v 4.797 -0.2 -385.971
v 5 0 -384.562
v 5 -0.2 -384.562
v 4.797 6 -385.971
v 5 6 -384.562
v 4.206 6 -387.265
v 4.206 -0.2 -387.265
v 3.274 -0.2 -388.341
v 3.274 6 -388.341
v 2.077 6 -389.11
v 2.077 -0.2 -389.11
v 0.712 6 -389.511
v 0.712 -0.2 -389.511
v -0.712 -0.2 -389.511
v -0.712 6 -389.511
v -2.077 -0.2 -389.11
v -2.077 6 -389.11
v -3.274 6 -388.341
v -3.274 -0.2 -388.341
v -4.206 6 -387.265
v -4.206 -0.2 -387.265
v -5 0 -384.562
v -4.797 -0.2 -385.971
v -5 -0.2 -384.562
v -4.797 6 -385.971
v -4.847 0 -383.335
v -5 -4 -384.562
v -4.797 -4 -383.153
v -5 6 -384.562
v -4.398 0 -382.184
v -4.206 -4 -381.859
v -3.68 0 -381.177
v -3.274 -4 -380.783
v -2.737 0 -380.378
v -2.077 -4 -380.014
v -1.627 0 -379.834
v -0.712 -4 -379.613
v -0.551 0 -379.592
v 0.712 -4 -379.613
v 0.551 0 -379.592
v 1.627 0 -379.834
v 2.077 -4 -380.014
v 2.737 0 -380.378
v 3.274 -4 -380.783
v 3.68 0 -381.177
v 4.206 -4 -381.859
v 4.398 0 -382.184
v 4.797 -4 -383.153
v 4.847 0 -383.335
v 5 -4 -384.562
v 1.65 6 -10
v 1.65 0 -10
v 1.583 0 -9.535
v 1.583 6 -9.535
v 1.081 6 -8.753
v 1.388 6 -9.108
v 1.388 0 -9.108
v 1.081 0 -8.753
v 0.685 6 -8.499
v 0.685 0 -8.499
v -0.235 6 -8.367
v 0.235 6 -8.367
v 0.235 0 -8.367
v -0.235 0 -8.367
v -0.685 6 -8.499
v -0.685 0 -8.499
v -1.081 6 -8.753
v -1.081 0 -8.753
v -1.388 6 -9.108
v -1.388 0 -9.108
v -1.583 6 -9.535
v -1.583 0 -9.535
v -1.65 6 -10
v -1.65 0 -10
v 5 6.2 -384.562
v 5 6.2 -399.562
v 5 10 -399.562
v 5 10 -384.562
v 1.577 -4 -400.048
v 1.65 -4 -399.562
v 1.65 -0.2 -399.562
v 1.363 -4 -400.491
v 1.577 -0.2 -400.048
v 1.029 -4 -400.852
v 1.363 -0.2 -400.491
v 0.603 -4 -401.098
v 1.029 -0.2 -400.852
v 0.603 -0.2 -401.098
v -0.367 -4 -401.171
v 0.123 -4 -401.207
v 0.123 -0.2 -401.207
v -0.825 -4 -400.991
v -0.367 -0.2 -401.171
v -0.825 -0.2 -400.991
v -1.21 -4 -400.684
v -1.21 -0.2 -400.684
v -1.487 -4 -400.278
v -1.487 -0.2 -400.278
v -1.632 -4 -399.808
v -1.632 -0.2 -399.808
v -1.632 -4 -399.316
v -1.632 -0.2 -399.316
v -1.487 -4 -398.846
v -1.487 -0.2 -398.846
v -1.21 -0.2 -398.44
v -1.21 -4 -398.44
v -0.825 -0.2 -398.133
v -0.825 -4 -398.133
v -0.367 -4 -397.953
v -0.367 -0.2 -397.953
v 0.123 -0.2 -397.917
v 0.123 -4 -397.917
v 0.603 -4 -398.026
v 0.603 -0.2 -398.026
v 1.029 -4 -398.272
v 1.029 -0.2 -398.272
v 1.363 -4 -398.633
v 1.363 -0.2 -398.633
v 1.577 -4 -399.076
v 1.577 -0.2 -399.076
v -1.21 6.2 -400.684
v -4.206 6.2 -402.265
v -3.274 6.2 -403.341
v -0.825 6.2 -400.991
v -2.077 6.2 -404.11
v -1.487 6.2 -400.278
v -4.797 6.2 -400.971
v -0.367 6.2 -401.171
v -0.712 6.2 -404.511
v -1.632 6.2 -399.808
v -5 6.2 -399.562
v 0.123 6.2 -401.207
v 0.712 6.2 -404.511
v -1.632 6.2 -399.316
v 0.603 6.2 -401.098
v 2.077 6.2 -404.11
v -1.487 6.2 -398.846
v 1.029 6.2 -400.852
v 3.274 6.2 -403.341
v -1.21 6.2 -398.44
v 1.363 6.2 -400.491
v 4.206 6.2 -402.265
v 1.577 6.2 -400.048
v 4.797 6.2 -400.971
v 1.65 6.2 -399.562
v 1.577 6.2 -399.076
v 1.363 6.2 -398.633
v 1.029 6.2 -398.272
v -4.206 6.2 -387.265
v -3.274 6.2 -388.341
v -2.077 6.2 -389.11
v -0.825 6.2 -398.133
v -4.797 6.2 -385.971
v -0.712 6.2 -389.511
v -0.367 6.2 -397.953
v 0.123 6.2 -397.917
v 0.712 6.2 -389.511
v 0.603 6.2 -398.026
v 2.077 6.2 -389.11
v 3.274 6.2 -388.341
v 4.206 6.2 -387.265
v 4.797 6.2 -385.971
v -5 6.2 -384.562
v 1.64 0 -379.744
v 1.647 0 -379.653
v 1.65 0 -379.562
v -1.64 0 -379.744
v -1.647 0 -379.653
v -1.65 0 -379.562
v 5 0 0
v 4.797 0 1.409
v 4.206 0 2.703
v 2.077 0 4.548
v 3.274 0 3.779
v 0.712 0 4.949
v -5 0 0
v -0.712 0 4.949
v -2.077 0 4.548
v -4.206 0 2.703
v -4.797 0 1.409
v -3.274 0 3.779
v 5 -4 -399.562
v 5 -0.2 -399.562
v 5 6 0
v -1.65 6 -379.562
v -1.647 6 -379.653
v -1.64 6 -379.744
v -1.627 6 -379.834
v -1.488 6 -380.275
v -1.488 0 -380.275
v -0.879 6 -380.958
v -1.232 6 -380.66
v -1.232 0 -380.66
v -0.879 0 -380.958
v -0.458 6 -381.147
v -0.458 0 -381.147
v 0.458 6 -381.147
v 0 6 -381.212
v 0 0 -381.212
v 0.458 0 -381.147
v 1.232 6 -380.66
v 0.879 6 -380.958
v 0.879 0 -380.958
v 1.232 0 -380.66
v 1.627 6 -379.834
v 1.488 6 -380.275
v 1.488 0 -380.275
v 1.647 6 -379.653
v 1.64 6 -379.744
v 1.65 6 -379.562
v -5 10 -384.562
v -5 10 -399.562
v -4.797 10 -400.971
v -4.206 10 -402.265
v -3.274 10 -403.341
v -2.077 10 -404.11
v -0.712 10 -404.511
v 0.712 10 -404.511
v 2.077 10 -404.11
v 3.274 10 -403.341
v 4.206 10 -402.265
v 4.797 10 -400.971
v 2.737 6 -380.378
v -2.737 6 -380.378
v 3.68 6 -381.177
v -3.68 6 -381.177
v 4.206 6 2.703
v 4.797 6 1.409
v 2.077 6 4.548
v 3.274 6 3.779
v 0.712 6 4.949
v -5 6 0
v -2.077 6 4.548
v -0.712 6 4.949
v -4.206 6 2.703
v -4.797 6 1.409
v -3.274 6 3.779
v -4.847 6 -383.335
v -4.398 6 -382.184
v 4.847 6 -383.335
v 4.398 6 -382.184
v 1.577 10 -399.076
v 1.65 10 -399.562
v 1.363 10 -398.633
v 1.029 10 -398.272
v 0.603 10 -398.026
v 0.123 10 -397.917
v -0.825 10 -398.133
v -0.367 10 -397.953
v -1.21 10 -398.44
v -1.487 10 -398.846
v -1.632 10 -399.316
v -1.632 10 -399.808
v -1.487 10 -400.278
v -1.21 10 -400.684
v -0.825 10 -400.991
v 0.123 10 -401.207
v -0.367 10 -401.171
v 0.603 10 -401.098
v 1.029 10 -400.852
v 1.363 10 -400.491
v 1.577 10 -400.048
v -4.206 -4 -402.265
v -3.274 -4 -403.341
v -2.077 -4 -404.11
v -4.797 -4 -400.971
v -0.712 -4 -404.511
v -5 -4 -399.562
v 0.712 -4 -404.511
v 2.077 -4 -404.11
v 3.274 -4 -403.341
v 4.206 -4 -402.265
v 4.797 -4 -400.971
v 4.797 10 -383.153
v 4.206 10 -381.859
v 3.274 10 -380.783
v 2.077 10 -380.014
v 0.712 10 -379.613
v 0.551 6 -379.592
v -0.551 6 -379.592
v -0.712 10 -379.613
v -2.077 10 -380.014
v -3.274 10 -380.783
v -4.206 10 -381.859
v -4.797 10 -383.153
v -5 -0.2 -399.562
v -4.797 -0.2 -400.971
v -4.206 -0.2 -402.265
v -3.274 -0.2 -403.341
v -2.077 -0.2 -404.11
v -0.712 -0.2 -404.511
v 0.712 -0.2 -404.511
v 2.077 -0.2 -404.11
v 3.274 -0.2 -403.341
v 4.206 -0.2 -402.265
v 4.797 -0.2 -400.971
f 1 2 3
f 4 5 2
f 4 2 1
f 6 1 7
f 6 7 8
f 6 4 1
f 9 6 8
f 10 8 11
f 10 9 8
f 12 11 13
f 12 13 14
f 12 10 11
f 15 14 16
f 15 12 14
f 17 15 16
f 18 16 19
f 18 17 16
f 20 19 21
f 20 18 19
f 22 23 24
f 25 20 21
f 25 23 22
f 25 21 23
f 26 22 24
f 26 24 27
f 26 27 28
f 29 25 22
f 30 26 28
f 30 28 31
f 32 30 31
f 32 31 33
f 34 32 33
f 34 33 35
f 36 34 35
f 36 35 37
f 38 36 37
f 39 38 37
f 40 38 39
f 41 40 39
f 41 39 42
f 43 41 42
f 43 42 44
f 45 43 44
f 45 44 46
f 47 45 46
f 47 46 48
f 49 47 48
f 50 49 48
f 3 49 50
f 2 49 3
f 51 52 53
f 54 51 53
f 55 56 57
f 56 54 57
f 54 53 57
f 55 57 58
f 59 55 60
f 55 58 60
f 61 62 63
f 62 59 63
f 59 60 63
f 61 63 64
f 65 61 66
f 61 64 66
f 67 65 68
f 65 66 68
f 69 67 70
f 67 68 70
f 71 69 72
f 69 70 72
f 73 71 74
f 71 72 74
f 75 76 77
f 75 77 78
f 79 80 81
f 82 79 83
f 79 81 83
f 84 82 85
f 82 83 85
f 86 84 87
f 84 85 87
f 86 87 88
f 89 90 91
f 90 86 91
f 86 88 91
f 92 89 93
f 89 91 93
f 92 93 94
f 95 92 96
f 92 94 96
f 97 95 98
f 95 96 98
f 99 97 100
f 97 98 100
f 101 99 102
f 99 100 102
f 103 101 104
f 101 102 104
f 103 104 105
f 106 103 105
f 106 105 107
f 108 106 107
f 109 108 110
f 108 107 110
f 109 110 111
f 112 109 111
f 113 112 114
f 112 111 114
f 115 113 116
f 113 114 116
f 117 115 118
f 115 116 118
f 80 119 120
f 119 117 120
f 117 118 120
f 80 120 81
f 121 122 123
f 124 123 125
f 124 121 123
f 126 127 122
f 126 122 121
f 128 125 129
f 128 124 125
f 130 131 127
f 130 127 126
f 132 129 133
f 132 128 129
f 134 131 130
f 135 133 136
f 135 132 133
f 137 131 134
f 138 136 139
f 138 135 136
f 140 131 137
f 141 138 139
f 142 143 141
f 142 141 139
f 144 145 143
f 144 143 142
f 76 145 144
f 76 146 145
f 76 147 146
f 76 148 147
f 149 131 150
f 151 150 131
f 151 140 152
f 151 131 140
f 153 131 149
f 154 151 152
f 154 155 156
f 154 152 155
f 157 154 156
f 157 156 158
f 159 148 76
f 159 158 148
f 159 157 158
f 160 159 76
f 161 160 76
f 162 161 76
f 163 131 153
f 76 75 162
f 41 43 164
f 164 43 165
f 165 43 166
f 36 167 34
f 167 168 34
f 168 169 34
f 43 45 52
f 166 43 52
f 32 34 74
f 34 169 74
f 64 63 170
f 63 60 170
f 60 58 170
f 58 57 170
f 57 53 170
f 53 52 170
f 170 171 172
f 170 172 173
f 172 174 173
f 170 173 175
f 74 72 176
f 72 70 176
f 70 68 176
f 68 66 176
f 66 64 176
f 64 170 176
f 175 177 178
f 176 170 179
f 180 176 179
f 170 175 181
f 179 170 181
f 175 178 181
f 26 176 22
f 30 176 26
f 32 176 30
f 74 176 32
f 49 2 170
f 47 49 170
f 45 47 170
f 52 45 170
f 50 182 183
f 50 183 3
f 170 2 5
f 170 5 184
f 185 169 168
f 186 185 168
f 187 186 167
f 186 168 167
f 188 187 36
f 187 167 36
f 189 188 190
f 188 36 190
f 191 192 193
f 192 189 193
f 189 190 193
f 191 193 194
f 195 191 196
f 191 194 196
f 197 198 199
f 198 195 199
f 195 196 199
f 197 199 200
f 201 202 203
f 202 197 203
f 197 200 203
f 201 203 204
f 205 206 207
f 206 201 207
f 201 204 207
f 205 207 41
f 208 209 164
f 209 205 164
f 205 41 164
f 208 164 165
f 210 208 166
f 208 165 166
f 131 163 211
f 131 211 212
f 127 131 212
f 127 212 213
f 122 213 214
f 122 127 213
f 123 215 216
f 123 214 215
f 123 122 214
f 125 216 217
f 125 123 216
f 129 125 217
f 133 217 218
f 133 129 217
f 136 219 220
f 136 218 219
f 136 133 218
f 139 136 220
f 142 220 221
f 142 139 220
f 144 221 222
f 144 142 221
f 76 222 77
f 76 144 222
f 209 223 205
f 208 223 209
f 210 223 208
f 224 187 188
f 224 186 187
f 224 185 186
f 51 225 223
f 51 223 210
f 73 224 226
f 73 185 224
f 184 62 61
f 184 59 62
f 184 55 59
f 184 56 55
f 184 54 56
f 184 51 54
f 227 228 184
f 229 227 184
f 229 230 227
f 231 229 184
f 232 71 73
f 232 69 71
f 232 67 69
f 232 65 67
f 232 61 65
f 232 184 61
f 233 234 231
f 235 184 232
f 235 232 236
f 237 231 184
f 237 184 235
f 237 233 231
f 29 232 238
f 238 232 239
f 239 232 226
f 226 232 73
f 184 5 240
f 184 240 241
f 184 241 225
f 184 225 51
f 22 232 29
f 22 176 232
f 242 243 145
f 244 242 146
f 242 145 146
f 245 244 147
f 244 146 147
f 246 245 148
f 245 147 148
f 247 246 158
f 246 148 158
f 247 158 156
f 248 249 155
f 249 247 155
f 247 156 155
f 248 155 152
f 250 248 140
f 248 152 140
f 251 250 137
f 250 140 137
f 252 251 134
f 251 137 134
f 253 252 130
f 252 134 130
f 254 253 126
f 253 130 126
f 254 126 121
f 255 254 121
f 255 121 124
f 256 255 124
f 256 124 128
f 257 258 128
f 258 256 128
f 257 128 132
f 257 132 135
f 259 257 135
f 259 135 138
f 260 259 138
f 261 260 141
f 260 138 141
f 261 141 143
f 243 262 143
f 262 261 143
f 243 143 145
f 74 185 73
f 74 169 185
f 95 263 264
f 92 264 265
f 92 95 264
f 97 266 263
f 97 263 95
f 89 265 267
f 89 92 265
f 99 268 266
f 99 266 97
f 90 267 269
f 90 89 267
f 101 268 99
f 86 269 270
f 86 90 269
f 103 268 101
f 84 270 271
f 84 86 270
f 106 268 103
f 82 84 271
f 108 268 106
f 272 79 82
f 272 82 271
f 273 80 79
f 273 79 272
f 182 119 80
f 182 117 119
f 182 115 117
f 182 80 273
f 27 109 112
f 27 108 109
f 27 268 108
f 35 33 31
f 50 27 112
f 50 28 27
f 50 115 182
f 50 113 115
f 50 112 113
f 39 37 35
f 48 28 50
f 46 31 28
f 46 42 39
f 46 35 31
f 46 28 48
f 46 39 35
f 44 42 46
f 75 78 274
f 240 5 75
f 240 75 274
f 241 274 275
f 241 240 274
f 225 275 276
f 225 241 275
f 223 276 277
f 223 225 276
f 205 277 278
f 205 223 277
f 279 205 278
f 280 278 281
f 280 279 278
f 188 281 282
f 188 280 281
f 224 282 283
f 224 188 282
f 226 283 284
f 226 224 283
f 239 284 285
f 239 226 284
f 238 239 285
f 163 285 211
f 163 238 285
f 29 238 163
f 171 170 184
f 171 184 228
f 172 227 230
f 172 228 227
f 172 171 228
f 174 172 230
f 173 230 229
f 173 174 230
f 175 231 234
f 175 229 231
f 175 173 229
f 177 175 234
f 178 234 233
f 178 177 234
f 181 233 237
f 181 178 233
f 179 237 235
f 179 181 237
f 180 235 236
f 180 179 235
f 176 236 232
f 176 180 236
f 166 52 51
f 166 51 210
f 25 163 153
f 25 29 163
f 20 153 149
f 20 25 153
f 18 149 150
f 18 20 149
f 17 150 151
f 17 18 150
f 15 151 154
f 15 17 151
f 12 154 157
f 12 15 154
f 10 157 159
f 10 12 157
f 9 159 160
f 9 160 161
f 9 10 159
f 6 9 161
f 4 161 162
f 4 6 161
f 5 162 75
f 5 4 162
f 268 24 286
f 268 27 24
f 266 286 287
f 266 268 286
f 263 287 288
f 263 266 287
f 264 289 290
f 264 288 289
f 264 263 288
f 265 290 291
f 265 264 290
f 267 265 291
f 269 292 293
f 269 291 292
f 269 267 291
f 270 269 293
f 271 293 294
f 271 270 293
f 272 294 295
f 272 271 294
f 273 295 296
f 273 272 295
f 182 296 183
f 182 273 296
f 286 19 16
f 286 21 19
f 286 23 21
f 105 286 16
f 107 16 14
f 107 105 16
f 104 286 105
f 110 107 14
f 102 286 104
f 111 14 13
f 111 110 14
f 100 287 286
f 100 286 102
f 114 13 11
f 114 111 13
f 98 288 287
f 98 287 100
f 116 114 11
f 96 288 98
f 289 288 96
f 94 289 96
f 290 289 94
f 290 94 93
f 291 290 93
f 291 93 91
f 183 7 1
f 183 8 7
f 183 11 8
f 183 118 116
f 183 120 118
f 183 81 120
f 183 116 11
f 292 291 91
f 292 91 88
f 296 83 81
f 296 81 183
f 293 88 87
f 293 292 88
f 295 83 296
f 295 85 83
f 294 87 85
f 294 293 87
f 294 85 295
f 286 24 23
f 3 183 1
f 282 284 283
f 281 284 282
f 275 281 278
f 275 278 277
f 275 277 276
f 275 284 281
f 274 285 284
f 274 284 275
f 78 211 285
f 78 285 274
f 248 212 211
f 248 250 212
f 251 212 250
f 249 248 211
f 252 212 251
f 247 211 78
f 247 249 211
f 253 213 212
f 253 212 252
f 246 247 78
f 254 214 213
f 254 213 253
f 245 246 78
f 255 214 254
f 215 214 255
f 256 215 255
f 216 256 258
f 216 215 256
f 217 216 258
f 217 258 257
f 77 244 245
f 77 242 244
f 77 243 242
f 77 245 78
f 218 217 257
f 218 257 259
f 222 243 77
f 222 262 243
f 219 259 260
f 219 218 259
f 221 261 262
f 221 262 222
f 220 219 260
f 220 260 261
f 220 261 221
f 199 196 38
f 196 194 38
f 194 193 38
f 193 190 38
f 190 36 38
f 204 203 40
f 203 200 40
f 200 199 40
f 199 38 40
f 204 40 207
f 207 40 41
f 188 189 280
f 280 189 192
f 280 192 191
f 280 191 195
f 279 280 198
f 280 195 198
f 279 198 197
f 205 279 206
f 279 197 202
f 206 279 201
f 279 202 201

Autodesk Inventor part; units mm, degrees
ref_plane "XZ Plane" through (0, 0, 0) normal (0, 1, 0) x (-1, 0, 0)
ref_plane "XY Plane" through (0, 0, 0) normal (0, 0, 1) x (1, 0, 0)
sketch "Sketch1" plane through (0, 0, 0) normal (0, 1, 0) x (-1, 0, 0)
  line L0 (0, 0) -> (0, -399.562) construction
  line L1 (5, 0) -> (5, -399.562)
  line L2 (-5, -399.562) -> (-5, 0)
  arc A0 (5, 0) -> (-5, 0) centre (0, 0) ccw
  arc A1 (-5, -399.562) -> (5, -399.562) centre (0, -399.562) ccw
  circle A2 centre (0, -399.562) radius 1.65
  line L3 (0, -10) -> (0, -379.562) construction
  line L4 (-1.65, -10) -> (-1.65, -379.562)
  line L5 (1.65, -379.562) -> (1.65, -10)
  arc A3 (1.65, -10) -> (-1.65, -10) centre (0, -10) ccw
  arc A4 (-1.65, -379.562) -> (1.65, -379.562) centre (0, -379.562) ccw
  point P0 (0, -199.781)
  point P1 (0, -194.781)
  dimension "d1" = 3.3
  dimension "d2" = 10
  dimension "d3" = 399.562
  dimension "d16" = 3.3
  dimension "d17" = 20
  dimension "d18" = 10
extrude "Extrusion1" add sketch "Sketch1" along normal blind 6
sketch "Sketch2" plane through (0, 6, 0) normal (0, 1, 0) x (1, 0, 0)
  line L0 (-5, 399.562) -> (-5, 0) projected
  arc A0 (-5, 0) -> (5, 0) centre (0, 0) ccw projected
  line L1 (5, 0) -> (5, 399.562) projected
  arc A1 (5, 399.562) -> (-5, 399.562) centre (0, 399.562) ccw projected
  arc A2 (-1.65, 10) -> (1.65, 10) centre (0, 10) ccw projected
  line L2 (-1.65, 10) -> (-1.65, 379.562) projected
  arc A3 (1.65, 379.562) -> (-1.65, 379.562) centre (0, 379.562) ccw projected
  line L3 (1.65, 379.562) -> (1.65, 10) projected
  circle A4 centre (0, 399.562) radius 1.65 projected
  line L4 (-5, 399.562) -> (-5, 0) projected
  line L5 (5, 0) -> (5, 399.562) projected
  circle A5 centre (0, 384.562) radius 5
  point P0 (-5, 384.562)
  point P1 (5, 384.562)
  dimension "d20" = 15
  dimension "d21" = 10
extrude "Extrusion2" add sketch "Sketch2" along normal blind 4 contours A1 L1 A5 L0 | A5 A3 | A3 A5
sketch "Sketch3" plane through (0, 0, 0) normal (0, -1, 0) x (1, 0, 0)
  line L0 (-5, -399.562) -> (-5, 0) projected
  arc A0 (-5, -399.562) -> (5, -399.562) centre (0, -399.562) ccw projected
  line L1 (5, 0) -> (5, -399.562) projected
  arc A1 (5, 0) -> (-5, 0) centre (0, 0) ccw projected
  arc A2 (1.65, -10) -> (-1.65, -10) centre (0, -10) ccw projected
  line L2 (1.65, -379.562) -> (1.65, -10) projected
  arc A3 (-1.65, -379.562) -> (1.65, -379.562) centre (0, -379.562) ccw projected
  line L3 (-1.65, -10) -> (-1.65, -379.562) projected
  circle A4 centre (0, -399.562) radius 1.65 projected
  circle A5 centre (0, -384.562) radius 5
  point P0 (5, -384.562)
  point P1 (-5, -384.562)
  dimension "d24" = 10
  dimension "d25" = 15
extrude "Extrusion3" add sketch "Sketch3" along normal blind 4 contours L0 A5 L1 A0 | A5 A3 | A5 A3
extrude "Extrusion4" cut sketch "Sketch2" against normal blind 6 contours A1 L1 A5 L0
sketch "Sketch4" plane through (0, 0, 0) normal (0, 1, 0) x (1, 0, 0)
  line L0 (-5, 384.562) -> (-5, 399.562) projected
  arc A0 (5, 384.562) -> (-5, 384.562) centre (0, 384.562) ccw projected
  line L1 (5, 399.562) -> (5, 384.562) projected
  arc A1 (5, 399.562) -> (-5, 399.562) centre (0, 399.562) ccw projected
  circle A2 centre (0, 399.562) radius 1.65 projected
  point P0 (0, 0)
extrude "Extrusion5" cut sketch "Sketch4" against normal blind 0.2
sketch "Sketch5" plane through (0, 6, 0) normal (0, -1, 0) x (1, 0, 0)
  line L0 (-5, -399.562) -> (-5, -384.562) projected
  arc A0 (-5, -399.562) -> (5, -399.562) centre (0, -399.562) ccw projected
  line L1 (5, -384.562) -> (5, -399.562) projected
  arc A1 (-5, -384.562) -> (5, -384.562) centre (0, -384.562) ccw projected
  circle A2 centre (0, -399.562) radius 1.65 projected
  point P0 (0, 0)
extrude "Extrusion6" cut sketch "Sketch5" against normal blind 0.2
